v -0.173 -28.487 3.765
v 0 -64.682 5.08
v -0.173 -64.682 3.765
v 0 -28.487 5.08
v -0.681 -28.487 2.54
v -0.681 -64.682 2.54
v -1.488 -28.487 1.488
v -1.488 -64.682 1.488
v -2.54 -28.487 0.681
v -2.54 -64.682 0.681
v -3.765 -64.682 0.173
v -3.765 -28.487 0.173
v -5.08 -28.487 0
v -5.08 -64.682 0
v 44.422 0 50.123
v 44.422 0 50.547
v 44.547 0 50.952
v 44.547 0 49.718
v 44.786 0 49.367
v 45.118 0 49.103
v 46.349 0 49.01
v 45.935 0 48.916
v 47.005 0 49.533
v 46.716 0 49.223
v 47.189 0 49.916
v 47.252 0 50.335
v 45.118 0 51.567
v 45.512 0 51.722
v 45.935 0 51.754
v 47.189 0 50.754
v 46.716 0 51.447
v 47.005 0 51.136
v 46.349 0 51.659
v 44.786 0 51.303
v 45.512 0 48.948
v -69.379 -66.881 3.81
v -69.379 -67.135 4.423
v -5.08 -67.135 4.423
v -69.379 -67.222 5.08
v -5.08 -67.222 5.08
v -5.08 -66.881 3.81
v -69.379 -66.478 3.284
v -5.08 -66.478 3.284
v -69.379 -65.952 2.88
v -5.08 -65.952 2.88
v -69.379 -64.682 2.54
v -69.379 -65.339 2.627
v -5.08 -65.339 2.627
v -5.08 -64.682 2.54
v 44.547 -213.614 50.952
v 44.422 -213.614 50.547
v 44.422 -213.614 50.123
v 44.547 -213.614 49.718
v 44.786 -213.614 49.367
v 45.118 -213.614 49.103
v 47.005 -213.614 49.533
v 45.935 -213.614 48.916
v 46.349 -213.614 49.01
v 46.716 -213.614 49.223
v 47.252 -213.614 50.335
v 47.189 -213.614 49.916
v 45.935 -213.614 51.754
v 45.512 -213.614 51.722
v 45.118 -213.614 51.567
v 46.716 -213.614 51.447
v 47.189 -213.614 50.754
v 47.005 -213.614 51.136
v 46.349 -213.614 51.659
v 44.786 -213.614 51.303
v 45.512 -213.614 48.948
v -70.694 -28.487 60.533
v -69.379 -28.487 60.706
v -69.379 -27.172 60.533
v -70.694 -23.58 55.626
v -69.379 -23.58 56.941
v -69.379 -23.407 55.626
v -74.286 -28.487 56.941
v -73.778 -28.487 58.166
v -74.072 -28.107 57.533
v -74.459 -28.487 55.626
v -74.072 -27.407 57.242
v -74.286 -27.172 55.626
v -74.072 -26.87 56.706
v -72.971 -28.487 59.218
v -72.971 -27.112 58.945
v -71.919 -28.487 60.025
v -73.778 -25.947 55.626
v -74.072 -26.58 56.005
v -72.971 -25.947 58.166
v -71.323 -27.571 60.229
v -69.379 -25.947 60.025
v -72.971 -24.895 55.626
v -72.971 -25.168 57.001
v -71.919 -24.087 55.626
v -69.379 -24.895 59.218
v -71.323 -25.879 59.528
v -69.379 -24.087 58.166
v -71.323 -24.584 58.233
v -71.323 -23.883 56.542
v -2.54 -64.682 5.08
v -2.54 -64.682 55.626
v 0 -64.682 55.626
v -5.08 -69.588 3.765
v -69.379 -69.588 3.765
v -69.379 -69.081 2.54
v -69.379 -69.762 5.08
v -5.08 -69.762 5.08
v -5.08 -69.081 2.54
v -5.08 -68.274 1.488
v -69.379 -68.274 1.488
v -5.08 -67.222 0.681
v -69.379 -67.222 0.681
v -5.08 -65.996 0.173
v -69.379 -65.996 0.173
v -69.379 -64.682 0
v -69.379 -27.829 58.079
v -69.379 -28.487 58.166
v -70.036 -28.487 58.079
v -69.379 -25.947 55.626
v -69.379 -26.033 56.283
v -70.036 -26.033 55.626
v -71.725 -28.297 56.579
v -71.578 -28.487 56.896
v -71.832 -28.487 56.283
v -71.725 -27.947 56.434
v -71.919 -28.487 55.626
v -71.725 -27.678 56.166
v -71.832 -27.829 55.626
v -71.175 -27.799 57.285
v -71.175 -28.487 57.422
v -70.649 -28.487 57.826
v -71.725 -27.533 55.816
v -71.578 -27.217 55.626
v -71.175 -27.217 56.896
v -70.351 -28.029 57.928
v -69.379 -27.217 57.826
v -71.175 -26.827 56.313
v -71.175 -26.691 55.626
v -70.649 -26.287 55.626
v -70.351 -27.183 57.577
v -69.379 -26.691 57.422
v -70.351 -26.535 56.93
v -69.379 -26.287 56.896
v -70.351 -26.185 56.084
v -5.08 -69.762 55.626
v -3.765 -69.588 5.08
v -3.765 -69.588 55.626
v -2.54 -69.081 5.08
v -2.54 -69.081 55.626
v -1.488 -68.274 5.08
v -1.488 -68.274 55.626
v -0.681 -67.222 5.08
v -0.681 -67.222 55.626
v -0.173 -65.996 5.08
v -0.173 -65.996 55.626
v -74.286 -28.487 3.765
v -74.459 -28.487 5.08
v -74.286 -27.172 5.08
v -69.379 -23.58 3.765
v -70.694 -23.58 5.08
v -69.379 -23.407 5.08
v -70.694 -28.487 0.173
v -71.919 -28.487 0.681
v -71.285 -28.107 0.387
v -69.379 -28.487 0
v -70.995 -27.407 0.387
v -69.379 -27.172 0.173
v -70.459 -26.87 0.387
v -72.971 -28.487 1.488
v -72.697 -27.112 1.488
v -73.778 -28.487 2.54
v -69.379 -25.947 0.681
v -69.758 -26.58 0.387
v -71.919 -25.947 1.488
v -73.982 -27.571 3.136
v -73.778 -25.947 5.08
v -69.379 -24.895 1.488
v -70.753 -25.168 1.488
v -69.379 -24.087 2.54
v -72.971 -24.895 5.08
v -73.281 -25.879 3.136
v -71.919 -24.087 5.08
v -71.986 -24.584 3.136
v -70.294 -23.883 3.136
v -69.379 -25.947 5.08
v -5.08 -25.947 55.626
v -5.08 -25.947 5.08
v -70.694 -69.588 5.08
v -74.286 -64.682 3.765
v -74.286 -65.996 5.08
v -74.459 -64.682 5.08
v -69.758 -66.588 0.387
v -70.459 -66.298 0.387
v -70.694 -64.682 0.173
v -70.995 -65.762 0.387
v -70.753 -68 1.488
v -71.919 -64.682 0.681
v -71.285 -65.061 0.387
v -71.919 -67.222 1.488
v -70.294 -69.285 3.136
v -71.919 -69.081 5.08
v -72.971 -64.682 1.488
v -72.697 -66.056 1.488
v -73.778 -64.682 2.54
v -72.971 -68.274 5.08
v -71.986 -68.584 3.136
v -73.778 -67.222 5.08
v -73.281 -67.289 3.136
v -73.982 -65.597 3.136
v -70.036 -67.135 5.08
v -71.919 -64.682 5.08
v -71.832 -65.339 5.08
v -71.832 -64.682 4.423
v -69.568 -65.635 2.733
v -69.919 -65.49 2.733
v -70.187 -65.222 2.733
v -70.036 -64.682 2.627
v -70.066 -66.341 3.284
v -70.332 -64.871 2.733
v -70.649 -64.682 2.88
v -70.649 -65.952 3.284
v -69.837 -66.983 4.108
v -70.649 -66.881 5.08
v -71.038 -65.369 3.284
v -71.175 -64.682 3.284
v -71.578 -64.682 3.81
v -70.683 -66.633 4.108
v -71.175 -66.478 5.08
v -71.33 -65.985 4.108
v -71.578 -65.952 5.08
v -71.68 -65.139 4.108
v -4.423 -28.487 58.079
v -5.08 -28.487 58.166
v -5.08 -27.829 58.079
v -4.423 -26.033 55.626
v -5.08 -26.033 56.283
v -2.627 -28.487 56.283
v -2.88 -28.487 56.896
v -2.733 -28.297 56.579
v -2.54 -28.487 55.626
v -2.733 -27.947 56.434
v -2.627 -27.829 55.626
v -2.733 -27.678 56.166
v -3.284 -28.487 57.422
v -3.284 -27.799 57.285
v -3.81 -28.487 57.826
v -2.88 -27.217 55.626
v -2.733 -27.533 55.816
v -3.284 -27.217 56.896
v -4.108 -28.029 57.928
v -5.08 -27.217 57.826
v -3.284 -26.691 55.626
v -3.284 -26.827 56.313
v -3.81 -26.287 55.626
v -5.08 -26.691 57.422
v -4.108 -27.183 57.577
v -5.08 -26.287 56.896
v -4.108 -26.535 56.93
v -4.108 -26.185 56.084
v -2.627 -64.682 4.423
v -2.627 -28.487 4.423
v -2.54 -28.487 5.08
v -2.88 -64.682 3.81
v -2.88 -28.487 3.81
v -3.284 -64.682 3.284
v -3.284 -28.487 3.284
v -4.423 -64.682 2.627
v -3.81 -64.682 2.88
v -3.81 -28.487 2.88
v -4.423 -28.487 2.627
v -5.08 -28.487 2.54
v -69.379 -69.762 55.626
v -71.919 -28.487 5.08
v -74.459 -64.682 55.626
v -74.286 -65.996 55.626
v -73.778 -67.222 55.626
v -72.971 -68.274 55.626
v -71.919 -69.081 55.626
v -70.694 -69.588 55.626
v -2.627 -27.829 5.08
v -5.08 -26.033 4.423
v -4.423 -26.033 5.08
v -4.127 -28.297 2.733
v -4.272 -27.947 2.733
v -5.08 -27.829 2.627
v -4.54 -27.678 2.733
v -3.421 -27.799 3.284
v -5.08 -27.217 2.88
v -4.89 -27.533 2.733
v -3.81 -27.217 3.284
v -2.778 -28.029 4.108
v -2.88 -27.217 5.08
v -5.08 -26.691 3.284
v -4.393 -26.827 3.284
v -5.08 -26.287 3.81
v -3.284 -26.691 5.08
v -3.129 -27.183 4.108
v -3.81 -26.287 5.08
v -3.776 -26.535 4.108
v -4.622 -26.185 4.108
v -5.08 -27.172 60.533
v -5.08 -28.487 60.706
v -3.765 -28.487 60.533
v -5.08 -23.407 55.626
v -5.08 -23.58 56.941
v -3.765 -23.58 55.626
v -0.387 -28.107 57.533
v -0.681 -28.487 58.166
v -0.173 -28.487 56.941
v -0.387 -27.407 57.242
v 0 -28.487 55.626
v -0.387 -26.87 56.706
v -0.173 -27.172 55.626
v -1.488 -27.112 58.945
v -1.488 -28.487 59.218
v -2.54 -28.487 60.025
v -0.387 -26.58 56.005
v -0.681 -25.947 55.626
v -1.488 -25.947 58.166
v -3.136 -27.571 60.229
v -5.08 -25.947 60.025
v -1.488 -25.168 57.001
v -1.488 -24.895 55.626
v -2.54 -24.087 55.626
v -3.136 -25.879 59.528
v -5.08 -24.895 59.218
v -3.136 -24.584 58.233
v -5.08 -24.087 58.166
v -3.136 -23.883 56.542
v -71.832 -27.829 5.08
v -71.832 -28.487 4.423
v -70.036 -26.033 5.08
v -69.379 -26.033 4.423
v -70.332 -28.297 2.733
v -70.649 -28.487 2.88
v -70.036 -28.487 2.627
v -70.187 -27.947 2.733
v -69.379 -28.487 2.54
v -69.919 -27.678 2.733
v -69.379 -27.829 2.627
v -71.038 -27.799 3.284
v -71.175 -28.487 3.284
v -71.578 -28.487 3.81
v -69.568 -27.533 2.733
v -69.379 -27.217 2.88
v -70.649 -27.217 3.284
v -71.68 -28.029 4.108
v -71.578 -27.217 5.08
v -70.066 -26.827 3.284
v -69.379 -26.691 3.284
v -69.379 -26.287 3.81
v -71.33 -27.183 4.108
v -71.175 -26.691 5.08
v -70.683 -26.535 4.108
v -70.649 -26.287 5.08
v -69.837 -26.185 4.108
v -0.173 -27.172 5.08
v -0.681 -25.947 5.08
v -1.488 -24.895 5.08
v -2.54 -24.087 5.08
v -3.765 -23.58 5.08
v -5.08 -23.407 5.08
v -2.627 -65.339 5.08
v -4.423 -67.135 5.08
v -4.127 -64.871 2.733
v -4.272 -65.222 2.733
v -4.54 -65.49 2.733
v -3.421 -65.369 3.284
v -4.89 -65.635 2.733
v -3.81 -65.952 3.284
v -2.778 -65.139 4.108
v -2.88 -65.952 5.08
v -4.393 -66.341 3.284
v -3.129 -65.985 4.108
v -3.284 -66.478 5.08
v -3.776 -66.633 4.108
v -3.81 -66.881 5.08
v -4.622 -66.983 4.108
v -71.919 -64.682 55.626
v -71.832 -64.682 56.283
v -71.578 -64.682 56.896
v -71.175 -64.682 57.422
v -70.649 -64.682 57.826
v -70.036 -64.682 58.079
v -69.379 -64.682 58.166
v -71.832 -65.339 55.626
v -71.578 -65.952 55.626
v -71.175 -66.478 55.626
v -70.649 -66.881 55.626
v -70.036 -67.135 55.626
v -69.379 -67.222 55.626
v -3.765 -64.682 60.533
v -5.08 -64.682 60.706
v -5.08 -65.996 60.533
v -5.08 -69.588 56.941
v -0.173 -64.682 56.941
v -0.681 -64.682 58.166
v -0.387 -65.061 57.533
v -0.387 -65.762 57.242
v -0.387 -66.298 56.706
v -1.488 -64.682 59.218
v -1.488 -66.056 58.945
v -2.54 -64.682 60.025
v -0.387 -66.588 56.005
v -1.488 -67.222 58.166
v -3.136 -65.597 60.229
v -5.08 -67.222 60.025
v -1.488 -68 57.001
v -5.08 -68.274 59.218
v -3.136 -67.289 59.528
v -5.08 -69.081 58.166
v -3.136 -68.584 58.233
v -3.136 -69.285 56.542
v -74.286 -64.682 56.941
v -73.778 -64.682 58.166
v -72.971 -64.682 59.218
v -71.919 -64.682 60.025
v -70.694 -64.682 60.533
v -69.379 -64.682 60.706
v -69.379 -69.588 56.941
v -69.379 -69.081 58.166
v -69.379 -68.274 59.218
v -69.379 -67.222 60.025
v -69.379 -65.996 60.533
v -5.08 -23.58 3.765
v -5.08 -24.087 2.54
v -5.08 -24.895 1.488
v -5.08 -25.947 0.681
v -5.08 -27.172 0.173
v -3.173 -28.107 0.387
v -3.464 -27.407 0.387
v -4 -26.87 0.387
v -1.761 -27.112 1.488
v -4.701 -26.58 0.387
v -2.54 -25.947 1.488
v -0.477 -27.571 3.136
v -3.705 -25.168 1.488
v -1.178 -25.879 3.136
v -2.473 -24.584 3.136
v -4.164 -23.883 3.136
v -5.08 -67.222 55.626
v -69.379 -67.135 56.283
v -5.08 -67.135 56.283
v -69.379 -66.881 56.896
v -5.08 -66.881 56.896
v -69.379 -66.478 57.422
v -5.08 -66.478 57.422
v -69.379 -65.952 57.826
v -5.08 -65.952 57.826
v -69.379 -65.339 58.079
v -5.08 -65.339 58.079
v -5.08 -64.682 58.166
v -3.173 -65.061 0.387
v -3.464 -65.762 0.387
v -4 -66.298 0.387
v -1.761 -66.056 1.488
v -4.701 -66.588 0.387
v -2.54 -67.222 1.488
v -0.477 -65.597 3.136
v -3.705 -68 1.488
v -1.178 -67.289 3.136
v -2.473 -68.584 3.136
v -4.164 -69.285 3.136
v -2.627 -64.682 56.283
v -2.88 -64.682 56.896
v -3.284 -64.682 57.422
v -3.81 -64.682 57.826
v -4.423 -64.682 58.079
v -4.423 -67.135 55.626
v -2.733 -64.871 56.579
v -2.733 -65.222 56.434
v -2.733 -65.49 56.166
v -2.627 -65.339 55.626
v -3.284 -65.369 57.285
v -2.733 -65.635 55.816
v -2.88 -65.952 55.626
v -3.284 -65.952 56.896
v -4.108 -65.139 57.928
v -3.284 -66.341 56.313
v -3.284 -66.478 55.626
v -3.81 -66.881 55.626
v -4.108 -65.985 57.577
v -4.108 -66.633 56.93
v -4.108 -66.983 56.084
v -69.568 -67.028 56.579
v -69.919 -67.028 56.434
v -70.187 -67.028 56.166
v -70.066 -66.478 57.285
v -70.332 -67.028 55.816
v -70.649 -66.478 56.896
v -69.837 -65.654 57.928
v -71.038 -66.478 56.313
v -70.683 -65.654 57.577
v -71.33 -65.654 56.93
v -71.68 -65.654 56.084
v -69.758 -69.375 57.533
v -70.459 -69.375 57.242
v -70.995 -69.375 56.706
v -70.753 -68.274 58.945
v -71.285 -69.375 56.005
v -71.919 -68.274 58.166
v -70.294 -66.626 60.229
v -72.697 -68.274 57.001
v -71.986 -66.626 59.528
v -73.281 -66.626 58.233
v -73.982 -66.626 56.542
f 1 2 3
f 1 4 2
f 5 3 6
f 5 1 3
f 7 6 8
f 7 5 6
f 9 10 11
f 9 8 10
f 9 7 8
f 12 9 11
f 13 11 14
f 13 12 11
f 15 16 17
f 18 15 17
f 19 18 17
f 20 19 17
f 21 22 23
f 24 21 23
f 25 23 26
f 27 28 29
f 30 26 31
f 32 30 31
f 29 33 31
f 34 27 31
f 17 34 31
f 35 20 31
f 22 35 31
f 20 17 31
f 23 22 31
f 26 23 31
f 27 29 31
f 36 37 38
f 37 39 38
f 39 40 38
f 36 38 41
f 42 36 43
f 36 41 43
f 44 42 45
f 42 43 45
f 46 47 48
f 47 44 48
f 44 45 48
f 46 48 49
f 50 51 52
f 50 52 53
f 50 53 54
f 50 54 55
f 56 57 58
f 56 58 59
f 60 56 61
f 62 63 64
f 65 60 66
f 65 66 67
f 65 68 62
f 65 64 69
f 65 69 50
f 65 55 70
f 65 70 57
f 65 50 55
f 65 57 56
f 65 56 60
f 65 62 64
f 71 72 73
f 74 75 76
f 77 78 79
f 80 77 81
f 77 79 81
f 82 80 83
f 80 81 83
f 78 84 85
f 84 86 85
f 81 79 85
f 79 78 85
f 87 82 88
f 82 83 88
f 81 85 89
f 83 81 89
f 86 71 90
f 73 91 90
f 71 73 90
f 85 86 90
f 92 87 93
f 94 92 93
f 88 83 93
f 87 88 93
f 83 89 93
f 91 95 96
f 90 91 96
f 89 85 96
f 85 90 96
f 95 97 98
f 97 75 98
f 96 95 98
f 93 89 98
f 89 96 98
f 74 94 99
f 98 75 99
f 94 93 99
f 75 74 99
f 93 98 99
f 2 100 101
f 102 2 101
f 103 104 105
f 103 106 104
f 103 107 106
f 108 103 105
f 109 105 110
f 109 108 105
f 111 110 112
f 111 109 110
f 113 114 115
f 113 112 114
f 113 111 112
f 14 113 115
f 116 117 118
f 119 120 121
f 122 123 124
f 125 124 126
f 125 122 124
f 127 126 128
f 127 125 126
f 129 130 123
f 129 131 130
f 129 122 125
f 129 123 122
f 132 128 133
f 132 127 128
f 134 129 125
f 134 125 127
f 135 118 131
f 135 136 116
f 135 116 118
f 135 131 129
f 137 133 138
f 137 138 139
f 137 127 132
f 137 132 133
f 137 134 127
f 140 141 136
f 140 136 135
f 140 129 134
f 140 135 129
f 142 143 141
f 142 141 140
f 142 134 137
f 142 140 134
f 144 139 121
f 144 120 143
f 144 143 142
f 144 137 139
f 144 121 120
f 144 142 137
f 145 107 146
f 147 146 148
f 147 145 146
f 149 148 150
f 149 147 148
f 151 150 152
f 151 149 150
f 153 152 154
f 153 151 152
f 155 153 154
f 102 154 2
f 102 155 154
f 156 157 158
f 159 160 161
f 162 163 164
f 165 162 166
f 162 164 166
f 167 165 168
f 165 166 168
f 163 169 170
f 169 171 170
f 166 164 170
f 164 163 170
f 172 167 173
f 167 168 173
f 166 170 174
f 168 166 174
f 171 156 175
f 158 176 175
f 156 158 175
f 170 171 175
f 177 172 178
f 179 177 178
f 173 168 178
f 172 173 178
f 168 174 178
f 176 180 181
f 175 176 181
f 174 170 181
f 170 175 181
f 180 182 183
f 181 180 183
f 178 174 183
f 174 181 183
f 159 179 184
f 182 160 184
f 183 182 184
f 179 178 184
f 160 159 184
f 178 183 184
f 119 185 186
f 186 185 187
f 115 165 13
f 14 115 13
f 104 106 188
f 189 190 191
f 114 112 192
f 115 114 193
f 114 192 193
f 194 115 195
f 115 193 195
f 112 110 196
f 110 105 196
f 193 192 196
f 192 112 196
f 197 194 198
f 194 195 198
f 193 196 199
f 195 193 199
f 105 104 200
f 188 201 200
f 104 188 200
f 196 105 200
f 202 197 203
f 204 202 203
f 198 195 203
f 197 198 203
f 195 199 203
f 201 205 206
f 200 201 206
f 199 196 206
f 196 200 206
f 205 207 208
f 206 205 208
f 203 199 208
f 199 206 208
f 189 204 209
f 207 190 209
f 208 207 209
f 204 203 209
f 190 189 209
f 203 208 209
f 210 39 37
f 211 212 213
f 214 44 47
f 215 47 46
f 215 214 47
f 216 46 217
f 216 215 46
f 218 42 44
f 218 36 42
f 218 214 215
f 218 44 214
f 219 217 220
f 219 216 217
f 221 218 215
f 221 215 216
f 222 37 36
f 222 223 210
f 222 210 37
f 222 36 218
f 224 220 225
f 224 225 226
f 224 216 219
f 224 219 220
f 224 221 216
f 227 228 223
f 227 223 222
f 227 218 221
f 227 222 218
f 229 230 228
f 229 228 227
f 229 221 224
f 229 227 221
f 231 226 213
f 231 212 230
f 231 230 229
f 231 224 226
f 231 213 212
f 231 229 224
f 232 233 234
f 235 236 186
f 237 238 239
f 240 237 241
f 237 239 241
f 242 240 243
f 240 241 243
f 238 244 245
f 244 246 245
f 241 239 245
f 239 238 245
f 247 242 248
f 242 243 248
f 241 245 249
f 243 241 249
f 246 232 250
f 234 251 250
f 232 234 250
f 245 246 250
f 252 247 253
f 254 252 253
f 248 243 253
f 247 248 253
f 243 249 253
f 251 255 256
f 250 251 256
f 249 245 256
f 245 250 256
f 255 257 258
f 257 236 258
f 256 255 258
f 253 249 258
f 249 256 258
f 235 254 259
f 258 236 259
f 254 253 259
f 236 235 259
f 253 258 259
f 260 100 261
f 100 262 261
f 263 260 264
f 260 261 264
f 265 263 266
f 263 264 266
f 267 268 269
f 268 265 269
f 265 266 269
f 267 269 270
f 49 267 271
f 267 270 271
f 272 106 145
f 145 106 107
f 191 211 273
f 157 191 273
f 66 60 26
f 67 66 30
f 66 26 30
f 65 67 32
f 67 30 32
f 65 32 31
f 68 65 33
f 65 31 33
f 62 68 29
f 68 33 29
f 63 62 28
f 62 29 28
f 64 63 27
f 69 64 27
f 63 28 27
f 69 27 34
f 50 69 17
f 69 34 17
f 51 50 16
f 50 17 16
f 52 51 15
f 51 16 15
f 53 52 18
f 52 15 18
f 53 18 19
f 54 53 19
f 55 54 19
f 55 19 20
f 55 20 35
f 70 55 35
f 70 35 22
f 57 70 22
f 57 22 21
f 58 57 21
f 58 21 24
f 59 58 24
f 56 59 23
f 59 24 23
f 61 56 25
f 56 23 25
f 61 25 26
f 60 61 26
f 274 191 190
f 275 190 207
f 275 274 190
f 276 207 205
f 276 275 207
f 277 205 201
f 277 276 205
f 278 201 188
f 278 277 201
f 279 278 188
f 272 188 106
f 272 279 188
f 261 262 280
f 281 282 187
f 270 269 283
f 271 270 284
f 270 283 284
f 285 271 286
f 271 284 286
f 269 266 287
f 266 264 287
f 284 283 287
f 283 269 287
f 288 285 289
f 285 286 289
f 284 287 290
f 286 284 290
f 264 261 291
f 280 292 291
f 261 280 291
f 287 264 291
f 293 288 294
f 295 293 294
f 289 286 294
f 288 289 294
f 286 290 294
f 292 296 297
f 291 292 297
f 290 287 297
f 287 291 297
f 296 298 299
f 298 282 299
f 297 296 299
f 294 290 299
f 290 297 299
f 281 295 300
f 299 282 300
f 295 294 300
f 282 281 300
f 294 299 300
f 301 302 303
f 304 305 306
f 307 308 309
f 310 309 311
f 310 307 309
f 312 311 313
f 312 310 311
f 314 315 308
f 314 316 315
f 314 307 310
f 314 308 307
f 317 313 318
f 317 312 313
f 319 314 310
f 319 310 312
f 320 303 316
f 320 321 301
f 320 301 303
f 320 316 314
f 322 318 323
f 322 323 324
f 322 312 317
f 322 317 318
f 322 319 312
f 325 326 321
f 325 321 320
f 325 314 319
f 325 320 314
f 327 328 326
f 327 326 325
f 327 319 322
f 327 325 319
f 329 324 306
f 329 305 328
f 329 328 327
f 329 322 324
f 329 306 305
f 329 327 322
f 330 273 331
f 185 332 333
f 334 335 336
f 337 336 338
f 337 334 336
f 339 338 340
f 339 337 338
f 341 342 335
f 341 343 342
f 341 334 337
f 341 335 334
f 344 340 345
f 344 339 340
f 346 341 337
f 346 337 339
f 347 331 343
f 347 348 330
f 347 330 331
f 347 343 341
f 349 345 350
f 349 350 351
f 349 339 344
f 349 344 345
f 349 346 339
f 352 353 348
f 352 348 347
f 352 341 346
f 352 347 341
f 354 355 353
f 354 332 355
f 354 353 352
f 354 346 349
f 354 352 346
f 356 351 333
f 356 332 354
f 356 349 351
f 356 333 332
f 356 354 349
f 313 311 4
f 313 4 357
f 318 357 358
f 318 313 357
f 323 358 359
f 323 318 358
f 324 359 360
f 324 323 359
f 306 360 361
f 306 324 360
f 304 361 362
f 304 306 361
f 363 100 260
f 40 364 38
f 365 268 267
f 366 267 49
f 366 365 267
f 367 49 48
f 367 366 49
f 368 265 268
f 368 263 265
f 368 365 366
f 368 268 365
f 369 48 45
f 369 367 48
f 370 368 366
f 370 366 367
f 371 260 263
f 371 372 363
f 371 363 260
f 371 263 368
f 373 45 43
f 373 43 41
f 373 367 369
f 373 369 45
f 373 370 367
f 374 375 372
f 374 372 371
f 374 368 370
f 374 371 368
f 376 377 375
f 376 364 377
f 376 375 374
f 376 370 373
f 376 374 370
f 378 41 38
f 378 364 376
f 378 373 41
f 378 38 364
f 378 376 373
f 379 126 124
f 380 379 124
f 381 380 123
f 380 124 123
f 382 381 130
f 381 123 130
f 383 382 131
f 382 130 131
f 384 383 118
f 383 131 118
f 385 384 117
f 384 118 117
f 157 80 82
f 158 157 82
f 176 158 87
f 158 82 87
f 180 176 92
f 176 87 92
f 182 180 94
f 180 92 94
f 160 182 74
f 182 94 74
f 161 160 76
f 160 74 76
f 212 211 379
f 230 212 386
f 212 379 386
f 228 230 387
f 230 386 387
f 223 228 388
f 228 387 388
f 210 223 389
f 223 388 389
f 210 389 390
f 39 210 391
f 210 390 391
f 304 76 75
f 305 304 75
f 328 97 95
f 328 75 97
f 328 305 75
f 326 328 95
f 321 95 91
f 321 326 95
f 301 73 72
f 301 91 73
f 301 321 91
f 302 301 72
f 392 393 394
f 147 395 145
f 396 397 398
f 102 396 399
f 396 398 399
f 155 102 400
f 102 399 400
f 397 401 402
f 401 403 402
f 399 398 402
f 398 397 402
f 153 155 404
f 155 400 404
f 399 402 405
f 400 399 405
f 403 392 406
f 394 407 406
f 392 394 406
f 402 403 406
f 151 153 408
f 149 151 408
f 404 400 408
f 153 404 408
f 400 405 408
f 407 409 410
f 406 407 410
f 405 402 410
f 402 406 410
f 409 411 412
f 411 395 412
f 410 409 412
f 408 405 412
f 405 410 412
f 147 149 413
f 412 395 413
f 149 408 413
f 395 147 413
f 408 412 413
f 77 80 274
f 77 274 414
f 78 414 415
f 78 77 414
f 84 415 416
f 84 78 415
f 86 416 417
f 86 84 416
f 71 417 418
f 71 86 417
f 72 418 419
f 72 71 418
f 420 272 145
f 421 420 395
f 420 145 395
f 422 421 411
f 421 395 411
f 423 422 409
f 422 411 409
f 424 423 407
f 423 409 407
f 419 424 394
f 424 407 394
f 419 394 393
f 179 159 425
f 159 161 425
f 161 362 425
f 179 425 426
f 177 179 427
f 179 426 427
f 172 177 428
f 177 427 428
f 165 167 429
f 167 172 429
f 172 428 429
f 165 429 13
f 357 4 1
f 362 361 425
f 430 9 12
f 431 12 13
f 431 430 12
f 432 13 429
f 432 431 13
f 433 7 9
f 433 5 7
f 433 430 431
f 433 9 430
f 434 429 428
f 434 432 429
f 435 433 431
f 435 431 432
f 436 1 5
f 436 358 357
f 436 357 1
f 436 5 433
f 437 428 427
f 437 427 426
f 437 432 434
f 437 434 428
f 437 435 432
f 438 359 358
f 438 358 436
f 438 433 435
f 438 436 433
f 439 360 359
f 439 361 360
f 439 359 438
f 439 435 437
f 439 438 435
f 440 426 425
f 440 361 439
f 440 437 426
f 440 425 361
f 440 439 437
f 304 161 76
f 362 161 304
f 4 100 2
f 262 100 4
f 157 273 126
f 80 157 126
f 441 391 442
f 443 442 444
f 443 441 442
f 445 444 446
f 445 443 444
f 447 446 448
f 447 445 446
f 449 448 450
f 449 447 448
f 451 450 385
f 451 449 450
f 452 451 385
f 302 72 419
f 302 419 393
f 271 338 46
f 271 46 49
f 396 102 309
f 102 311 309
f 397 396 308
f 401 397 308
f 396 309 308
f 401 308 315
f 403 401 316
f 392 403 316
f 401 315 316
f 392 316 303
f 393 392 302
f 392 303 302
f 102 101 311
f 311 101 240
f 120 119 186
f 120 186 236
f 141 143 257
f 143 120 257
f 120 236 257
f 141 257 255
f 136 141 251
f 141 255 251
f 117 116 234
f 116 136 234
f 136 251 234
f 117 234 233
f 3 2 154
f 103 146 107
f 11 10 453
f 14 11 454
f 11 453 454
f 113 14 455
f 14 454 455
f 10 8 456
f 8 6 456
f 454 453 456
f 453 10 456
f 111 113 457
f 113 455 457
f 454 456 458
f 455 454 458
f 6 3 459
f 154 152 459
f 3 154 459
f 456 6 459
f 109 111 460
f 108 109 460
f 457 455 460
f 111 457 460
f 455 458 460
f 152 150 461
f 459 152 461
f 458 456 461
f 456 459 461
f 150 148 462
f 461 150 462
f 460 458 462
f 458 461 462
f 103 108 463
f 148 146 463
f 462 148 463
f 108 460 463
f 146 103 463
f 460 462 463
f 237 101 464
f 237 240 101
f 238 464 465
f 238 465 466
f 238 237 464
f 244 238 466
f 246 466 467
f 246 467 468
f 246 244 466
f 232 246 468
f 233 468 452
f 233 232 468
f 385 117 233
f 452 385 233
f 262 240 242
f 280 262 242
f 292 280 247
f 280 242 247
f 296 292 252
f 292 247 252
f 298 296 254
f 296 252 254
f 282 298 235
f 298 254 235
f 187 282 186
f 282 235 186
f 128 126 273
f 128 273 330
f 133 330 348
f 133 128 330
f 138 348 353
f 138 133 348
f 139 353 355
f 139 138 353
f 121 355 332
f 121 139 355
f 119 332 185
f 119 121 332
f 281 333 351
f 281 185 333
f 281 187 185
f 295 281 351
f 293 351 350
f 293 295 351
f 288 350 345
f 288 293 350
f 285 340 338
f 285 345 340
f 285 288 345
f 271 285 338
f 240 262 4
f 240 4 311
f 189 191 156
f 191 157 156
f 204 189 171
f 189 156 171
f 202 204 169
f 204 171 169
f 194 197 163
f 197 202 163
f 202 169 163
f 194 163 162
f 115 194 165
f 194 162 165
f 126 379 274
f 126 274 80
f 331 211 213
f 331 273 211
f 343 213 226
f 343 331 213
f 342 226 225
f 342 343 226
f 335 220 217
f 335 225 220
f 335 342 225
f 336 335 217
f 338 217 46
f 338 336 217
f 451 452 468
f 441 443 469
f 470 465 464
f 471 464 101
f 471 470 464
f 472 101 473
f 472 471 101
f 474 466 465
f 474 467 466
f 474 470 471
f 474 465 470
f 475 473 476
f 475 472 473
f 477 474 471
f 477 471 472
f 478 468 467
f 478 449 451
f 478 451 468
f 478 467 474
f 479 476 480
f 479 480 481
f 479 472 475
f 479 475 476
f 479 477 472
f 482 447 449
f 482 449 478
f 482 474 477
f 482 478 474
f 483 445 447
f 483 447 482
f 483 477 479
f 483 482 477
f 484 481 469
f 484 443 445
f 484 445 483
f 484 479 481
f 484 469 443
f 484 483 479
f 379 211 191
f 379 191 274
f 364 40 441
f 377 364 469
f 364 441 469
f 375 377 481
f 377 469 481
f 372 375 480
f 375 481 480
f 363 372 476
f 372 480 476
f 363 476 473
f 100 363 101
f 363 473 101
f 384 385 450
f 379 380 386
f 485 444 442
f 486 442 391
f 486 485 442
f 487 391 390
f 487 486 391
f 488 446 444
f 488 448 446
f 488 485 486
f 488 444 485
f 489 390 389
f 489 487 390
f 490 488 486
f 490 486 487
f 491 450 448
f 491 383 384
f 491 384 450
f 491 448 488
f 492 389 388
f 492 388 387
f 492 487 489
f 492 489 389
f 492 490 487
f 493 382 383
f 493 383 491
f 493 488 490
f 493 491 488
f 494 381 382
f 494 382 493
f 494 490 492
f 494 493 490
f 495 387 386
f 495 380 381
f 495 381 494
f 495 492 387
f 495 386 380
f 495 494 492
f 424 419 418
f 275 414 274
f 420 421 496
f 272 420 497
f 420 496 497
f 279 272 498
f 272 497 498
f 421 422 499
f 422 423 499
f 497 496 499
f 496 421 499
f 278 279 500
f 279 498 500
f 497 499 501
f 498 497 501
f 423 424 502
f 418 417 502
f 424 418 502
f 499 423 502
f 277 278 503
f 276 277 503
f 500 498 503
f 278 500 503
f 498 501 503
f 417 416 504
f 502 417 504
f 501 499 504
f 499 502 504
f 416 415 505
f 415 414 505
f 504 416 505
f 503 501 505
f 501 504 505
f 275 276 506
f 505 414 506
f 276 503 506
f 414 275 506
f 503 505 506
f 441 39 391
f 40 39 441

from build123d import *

# Parameters (mm, degrees)
F0_W     = 74.4587779045
F0_H     = 46.3549848646
F1_DEPTH = 60.706
F2_R     = 5.08
F3_T     = -2.54
F4_R     = 1.4228267919
F5_DEPTH = 213.614


# Not quite as in the source:
# - a shell that OpenCascade refuses in one call is made with other operations: the cavity is built on its own and cut out


with BuildPart() as f1:
    # F0 (on Top) → F1 (new body)
    with BuildSketch(Plane.XY):
        with Locations((-37.2293889523, -46.5841041878)):
            Rectangle(F0_W, F0_H)
    extrude(amount=F1_DEPTH)

    # F2
    f2_edges = [f1.edges().sort_by_distance(p)[0] for p in [
        (-37.229389, -23.406612, 60.706),
        (-74.458778, -46.584104, 60.706),
        (-37.229389, -69.761597, 60.706),
        (0, -46.584104, 60.706),
        (0, -69.761597, 30.353),
        (0, -23.406612, 30.353),
        (0, -46.584104, 0),
        (-74.458778, -69.761597, 30.353),
        (-37.229389, -69.761597, 0),
        (-74.458778, -23.406612, 30.353),
        (-74.458778, -46.584104, 0),
        (-37.229389, -23.406612, 0),
    ]]
    fillet(f2_edges, radius=F2_R)

    # F3: a shell. OpenCascade refuses it in one call, so the cavity is built on its own and cut out:
    # the body offset inwards by the wall thickness, plus a prism from it out through each open face.
    f3_core = offset(f1.part, amount=F3_T, mode=Mode.PRIVATE)
    f3_exits = [f3_core.faces().sort_by_distance(p)[0] for p in [
        (-2.54, -46.584104, 30.353),
        (-71.918778, -46.584104, 30.353),
    ]]
    add(f3_core, mode=Mode.SUBTRACT)
    extrude(f3_exits, amount=-F3_T, mode=Mode.SUBTRACT)


with BuildPart() as f5:
    # F4 (on Front) → F5 (new body)
    with BuildSketch(Plane.XZ):
        with Locations((45.8290316164, 50.3349490464)):
            Circle(F4_R)
    extrude(amount=F5_DEPTH)


solid = Compound([f1.part, f5.part])
